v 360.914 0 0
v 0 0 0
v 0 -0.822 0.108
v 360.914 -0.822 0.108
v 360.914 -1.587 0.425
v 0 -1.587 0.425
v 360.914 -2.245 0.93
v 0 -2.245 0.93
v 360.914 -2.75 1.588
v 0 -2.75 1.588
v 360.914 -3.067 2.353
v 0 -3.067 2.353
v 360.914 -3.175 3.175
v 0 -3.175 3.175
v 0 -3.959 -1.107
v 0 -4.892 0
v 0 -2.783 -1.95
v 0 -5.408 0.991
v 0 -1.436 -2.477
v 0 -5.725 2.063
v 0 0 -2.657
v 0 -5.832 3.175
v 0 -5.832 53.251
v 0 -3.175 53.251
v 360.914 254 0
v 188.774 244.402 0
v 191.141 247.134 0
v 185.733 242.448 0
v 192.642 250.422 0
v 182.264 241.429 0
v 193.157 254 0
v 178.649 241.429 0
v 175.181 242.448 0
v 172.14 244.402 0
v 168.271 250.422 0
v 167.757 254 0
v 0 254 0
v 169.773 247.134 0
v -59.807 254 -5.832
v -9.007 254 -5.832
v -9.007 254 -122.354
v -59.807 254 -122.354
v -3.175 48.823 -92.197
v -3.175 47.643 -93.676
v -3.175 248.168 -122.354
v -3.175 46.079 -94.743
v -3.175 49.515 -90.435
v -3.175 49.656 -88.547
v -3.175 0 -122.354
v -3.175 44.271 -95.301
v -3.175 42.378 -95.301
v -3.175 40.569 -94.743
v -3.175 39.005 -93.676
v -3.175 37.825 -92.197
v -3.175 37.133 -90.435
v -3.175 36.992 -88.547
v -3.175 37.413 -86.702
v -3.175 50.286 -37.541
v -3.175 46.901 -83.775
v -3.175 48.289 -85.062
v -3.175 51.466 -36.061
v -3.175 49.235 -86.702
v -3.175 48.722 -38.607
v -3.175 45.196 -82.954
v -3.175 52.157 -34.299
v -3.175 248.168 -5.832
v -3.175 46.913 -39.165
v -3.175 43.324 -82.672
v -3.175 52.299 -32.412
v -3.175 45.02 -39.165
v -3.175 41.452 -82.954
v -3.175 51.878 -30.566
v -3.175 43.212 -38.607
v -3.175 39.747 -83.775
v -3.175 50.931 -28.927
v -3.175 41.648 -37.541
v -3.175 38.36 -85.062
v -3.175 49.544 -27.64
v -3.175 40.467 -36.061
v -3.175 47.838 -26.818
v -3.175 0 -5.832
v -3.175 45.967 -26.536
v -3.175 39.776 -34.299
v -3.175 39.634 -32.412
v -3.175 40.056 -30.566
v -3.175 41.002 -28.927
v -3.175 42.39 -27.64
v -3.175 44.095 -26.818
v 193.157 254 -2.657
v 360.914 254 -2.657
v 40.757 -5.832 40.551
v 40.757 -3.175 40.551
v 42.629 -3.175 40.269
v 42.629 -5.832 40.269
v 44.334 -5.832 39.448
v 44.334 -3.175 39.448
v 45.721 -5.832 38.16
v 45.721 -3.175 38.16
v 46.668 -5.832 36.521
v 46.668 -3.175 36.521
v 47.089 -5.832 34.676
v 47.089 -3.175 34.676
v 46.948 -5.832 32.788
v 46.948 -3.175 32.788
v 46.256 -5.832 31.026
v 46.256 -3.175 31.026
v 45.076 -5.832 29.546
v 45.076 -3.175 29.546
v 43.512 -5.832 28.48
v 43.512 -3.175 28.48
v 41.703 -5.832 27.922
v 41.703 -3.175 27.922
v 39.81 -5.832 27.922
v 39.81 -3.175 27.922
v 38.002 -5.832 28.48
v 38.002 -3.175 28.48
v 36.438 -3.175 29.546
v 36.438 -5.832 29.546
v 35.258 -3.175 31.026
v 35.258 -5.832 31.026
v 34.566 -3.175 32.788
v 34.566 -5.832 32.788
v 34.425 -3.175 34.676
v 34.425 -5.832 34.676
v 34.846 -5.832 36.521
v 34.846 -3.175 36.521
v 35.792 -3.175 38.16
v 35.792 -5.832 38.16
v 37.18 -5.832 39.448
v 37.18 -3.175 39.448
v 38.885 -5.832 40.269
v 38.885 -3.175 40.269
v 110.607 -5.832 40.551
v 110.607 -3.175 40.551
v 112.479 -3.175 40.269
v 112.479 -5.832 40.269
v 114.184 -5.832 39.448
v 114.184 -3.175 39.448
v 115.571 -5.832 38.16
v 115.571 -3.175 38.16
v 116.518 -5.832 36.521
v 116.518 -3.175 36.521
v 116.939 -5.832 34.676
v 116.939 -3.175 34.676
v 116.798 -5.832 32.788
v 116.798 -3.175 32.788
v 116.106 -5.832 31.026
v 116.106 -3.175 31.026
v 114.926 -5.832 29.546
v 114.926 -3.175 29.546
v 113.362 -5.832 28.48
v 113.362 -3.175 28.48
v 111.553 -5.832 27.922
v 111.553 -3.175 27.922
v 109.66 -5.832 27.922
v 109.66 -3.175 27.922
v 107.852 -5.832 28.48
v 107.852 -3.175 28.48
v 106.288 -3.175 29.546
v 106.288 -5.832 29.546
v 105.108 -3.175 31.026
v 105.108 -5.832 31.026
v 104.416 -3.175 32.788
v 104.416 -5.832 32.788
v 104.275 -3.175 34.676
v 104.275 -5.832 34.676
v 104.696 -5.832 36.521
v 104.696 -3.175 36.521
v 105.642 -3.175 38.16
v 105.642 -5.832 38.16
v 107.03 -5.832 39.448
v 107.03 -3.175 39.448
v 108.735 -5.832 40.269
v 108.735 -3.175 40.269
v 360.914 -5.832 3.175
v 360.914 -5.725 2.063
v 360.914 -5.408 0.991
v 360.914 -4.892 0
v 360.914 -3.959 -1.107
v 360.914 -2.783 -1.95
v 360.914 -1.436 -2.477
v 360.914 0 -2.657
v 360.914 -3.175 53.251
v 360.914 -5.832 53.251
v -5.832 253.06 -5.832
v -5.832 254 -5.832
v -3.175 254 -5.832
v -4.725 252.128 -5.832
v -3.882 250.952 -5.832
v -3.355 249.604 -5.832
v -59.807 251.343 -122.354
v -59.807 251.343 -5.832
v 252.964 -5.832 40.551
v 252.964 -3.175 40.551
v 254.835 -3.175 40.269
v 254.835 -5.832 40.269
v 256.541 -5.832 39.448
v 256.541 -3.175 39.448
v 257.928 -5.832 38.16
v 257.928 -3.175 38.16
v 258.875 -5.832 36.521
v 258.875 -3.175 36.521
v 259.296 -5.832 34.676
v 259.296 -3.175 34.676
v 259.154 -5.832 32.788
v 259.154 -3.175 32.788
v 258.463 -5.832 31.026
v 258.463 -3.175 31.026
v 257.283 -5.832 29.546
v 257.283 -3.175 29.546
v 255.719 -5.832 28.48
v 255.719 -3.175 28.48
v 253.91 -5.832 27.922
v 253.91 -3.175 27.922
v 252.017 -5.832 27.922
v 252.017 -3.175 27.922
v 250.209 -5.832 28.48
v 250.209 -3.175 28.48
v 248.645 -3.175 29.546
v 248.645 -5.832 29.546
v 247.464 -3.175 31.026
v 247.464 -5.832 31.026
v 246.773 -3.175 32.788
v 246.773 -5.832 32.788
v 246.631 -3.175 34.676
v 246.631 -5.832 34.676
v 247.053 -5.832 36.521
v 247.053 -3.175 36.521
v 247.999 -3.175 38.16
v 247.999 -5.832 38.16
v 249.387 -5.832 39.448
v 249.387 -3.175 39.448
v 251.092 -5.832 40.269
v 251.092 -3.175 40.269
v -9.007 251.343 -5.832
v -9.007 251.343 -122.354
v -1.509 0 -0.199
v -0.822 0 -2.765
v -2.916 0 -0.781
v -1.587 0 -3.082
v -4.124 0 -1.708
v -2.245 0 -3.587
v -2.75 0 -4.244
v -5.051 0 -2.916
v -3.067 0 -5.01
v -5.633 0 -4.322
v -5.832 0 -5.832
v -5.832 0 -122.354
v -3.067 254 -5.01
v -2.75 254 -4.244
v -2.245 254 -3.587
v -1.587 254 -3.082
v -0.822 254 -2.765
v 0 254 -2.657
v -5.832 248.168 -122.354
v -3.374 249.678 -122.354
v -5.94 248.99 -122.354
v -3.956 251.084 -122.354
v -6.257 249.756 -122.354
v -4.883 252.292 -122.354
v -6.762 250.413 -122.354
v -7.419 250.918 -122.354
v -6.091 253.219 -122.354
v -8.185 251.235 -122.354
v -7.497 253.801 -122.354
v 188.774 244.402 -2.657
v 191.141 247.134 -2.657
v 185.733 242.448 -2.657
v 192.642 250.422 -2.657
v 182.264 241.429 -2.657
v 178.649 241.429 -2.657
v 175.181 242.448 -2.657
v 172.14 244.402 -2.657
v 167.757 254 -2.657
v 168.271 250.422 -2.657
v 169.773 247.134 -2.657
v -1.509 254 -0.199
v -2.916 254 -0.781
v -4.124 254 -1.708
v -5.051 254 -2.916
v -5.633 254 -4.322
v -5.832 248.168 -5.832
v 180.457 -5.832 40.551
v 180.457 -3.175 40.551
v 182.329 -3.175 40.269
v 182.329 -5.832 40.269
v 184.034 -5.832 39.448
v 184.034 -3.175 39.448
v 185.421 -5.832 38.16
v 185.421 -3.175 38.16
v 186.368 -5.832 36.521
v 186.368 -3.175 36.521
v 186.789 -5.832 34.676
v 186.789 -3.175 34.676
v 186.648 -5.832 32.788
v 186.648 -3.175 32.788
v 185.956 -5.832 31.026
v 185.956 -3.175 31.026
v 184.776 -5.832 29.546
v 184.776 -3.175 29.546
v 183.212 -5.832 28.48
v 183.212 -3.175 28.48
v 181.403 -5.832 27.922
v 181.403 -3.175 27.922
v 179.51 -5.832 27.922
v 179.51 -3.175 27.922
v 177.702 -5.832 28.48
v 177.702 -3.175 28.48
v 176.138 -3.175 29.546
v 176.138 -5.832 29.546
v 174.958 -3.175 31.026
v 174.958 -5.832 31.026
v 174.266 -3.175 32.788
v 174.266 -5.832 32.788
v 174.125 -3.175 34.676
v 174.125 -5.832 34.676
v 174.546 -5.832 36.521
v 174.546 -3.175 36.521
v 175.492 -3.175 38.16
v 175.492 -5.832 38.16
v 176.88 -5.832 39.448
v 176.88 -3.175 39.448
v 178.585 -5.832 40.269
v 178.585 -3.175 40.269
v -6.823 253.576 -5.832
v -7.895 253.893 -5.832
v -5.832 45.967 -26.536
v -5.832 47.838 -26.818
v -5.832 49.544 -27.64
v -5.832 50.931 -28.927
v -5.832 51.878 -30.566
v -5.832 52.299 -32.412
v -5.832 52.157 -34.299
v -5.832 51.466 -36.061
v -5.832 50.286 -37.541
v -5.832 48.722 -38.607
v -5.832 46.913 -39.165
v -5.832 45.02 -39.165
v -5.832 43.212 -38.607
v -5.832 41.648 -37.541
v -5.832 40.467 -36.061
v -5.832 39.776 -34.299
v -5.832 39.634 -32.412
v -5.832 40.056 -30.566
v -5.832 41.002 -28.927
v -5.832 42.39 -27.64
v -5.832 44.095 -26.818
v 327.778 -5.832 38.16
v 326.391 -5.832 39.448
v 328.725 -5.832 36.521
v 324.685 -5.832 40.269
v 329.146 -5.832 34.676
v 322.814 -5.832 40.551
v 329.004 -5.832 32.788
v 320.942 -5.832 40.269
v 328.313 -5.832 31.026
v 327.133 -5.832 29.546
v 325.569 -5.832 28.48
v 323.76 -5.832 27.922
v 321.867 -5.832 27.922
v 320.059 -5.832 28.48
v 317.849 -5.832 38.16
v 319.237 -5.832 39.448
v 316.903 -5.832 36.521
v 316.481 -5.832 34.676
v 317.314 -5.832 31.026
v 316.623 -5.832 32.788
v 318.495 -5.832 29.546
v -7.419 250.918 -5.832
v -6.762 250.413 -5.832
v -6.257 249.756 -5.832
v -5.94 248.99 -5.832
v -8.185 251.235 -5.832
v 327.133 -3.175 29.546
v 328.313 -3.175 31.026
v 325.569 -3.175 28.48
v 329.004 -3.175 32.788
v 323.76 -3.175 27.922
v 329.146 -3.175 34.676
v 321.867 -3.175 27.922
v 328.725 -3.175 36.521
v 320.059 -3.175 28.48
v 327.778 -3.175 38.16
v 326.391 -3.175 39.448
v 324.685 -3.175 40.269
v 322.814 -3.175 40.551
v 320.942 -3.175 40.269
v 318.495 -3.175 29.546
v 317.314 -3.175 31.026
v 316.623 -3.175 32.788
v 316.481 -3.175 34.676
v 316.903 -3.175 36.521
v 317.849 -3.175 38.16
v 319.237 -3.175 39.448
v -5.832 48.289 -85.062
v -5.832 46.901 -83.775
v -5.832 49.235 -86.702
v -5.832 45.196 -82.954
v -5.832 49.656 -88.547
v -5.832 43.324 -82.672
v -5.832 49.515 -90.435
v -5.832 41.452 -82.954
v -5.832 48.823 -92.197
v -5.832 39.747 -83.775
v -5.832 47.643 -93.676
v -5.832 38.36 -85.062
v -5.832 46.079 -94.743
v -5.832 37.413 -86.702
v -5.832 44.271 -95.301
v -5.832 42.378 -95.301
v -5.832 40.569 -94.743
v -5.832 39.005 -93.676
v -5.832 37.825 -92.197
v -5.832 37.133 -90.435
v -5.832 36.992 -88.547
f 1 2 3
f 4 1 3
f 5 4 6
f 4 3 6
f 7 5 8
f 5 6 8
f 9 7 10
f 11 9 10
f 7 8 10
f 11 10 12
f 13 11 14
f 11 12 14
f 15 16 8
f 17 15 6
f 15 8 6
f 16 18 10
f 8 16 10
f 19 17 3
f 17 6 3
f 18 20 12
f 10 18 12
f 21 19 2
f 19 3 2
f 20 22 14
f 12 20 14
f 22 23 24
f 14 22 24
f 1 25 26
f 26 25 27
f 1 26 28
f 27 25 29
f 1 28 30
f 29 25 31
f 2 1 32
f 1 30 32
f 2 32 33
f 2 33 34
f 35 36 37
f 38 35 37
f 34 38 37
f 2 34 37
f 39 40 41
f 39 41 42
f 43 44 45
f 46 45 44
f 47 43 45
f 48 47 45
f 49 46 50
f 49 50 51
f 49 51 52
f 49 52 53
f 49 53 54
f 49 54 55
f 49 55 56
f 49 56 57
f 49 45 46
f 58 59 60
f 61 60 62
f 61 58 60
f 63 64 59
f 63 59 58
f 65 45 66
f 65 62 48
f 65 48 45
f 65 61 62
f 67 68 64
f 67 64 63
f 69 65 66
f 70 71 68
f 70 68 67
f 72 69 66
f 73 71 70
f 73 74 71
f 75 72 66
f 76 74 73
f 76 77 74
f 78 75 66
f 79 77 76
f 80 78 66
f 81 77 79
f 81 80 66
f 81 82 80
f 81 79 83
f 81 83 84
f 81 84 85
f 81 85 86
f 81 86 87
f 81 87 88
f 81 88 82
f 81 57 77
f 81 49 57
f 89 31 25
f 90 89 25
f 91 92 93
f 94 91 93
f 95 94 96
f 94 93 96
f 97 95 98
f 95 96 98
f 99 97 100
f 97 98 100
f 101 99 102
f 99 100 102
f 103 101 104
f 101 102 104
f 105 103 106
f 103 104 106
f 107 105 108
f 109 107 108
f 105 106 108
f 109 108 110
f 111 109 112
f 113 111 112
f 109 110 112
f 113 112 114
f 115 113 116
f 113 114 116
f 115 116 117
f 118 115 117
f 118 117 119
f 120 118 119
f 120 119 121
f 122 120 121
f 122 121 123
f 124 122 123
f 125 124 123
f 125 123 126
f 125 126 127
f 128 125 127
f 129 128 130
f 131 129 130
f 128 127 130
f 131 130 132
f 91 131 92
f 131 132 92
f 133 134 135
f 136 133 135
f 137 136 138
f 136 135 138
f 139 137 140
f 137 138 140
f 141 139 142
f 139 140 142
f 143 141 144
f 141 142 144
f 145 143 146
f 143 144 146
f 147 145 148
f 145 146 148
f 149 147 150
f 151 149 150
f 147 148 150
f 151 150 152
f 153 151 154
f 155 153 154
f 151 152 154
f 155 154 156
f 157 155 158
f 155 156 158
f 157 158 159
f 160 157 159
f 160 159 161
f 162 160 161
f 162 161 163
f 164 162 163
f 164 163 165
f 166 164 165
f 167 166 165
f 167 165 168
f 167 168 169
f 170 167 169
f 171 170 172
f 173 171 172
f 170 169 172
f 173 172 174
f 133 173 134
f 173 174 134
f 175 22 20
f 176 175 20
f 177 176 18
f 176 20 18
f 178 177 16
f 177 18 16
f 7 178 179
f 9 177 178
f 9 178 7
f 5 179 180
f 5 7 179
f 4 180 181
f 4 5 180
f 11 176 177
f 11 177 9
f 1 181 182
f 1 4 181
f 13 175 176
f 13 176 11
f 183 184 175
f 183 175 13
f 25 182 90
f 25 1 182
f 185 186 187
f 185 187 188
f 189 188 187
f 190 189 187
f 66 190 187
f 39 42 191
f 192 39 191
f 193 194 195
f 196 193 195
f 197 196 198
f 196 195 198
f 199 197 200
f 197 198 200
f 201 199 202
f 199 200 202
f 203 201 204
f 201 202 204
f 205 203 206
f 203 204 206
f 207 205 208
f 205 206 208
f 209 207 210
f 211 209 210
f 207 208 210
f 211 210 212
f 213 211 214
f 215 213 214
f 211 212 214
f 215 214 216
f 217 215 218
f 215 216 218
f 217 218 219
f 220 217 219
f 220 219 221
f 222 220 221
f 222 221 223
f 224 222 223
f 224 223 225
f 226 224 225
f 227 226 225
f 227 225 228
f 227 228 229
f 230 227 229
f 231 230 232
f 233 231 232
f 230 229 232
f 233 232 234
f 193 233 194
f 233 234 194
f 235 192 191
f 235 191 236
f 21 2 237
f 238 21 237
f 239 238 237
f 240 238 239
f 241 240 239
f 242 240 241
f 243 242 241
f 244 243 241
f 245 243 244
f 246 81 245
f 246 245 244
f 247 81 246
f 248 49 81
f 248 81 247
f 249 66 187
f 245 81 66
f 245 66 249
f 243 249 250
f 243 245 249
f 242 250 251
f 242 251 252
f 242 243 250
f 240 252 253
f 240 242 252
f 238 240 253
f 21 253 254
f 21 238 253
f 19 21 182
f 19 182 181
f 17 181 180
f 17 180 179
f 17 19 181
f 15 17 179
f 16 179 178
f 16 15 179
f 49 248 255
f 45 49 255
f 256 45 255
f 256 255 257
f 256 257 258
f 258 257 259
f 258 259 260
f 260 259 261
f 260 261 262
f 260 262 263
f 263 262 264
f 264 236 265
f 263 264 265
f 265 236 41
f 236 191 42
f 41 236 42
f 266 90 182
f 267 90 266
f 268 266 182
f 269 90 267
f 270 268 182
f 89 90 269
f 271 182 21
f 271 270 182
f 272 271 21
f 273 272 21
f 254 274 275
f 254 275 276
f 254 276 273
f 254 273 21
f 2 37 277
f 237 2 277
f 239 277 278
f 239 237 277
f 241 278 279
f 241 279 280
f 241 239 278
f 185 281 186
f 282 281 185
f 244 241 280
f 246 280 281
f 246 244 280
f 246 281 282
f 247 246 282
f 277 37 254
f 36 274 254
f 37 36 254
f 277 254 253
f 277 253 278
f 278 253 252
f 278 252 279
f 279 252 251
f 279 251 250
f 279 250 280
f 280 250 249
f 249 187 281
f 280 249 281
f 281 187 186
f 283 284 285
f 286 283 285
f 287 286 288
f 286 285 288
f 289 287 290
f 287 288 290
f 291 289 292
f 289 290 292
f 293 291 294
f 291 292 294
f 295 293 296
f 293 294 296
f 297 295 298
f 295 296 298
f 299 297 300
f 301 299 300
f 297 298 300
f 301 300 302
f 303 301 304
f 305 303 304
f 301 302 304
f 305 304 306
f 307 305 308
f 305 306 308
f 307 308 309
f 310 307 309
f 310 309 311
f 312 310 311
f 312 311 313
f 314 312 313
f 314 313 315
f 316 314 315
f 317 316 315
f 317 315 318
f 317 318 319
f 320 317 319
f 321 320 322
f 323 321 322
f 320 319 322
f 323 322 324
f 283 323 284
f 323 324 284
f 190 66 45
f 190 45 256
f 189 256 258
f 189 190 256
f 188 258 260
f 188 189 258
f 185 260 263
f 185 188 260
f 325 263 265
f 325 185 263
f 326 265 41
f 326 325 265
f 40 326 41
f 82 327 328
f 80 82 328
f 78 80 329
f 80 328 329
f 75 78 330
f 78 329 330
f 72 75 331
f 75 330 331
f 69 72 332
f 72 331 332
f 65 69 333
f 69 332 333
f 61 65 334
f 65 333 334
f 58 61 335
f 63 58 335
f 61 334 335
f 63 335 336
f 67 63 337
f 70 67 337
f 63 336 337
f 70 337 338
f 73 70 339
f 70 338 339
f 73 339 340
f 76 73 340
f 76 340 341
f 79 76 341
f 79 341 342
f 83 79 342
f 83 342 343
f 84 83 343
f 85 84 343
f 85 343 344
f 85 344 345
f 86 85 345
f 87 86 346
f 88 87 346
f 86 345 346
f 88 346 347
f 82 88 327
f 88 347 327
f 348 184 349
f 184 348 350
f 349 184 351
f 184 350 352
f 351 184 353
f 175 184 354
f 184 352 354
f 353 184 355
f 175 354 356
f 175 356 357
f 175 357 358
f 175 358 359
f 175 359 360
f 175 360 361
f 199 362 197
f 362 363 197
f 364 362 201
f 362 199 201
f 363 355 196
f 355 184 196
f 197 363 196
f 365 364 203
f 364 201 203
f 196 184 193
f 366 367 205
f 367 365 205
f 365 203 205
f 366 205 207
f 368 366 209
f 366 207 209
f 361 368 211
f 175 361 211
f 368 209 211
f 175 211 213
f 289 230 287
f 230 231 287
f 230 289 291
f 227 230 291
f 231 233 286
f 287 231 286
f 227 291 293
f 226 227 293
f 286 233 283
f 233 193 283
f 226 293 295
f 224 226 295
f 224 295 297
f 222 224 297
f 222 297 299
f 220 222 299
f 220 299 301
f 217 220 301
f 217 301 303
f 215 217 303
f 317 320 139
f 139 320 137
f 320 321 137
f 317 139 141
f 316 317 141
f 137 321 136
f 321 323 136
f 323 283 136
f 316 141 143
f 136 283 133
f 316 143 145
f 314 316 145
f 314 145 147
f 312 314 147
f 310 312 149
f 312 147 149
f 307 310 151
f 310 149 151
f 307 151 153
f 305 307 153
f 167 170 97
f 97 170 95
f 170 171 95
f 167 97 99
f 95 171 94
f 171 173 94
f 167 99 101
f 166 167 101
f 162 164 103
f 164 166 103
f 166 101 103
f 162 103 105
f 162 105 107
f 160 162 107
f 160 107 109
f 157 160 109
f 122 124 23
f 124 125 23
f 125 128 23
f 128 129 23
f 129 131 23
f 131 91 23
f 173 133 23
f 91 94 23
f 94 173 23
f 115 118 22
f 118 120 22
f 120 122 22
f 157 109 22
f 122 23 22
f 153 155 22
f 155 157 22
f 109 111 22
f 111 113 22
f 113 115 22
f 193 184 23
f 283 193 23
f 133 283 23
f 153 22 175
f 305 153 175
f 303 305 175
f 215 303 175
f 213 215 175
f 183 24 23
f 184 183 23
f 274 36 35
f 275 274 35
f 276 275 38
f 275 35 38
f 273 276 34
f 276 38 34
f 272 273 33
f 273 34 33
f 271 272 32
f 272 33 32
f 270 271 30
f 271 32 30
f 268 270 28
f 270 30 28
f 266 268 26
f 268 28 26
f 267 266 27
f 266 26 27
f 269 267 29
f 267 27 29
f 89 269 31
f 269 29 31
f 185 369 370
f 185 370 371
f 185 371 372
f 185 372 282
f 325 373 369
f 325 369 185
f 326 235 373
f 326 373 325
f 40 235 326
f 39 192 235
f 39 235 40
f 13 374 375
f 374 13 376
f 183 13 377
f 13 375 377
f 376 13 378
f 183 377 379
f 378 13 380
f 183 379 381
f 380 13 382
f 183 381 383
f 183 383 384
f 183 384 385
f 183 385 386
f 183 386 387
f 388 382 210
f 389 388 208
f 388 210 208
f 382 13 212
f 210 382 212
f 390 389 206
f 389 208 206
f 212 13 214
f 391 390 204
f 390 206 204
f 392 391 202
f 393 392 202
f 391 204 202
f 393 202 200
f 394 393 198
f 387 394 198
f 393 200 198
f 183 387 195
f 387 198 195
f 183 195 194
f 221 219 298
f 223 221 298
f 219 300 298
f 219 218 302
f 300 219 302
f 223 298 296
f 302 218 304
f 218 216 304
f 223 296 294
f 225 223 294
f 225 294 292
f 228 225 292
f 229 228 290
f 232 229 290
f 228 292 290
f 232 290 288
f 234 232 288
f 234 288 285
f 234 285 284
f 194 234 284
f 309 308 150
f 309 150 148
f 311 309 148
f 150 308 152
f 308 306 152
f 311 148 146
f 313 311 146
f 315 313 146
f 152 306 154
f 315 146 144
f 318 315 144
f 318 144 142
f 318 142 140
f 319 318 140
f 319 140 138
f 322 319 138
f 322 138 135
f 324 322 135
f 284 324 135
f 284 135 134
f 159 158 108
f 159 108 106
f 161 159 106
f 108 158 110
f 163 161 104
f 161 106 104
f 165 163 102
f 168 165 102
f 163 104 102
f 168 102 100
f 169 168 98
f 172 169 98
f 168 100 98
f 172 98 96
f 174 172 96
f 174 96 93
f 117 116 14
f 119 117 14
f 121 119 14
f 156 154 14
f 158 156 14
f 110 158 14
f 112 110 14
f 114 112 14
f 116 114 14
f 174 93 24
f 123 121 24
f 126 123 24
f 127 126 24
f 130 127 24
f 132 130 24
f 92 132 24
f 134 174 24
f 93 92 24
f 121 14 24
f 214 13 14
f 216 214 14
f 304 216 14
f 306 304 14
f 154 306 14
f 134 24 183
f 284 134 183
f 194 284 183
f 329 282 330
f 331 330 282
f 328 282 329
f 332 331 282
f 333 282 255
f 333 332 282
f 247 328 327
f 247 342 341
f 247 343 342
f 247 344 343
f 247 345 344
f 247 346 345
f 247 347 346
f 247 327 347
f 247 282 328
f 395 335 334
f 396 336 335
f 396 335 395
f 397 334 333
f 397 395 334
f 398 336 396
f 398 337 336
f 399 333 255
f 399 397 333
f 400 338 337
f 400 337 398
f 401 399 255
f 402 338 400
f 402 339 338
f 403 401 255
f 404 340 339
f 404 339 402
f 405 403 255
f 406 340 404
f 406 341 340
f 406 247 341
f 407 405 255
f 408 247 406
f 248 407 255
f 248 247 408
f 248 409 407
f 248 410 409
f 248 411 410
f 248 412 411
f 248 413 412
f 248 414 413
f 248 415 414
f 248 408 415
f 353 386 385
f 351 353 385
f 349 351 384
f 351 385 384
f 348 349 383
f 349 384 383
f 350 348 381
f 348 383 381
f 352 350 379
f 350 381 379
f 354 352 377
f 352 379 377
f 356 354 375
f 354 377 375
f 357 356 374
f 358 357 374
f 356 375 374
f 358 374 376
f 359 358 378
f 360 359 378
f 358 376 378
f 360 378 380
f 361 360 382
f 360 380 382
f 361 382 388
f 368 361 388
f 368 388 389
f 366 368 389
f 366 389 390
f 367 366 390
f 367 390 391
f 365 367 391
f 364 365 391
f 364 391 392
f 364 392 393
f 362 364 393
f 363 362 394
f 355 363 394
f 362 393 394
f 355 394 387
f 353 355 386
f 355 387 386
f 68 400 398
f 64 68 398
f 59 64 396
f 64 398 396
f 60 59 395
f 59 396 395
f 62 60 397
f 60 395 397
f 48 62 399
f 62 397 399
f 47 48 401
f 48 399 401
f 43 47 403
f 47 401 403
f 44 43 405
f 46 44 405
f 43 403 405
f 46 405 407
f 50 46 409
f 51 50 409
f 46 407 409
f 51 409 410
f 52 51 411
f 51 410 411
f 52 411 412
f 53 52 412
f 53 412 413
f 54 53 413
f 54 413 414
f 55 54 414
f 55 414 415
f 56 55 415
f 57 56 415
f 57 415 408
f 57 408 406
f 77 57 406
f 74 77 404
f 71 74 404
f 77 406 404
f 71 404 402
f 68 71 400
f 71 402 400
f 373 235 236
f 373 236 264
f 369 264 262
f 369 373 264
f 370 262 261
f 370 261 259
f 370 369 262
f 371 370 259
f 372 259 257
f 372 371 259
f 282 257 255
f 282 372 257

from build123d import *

# Parameters (mm, degrees)
BASE_FLANGE1_DEPTH           = 2.65684
SKETCHED_BEND3_DEPTH         = 360.91368
SKETCHED_BEND3_2_DEPTH       = 360.91368
SKETCH10_R                   = 6.35
CUT_EXTRUDE2_DEPTH           = 2.65684
EDGE_FLANGE5_DEPTH           = 254
EDGE_FLANGE6_STRIP_W         = 16.97736
EDGE_FLANGE6_STRIP_H         = 2.65684
EDGE_FLANGE6_STRIP_CUT_DEPTH = 116.5225
EDGE_FLANGE6_DEPTH           = 116.5225
SKETCH36_R                   = 6.35
CUT_EXTRUDE3_DEPTH           = 2.65684


# Read off the part's stored shape, not the designer's step: Sketched Bend3
# Sheet-metal steps are written as plain solids
with BuildPart() as part:
    # Sketch1 → Base-Flange1 (new body)
    with BuildSketch(Plane.XY):
        with BuildLine():
            Line((0, 0), (0, 254))
            Line((0, 254), (167.75684, 254))
            ThreePointArc((167.75684, 254), (180.45684, 241.3), (193.15684, 254))
            Line((193.15684, 254), (360.91368, 254))
            Line((360.91368, 254), (360.91368, 0))
            Line((360.91368, 0), (360.91368, -57.15))
            Line((360.91368, -57.15), (0, -57.15))
            Line((0, -57.15), (0, 0))
        make_face()
    extrude(amount=-BASE_FLANGE1_DEPTH)

    # Sketched Bend3 outline → Sketched Bend3 (cut)
    with BuildSketch(Plane.YZ):
        with BuildLine():
            ThreePointArc((0, -2.65684), (-2.783367186, -1.949765838), (-4.891802611, 0))
            Line((-4.891802611, 0), (-57.15, 0))
            Line((-57.15, 0), (-57.15, -2.65684))
            Line((-57.15, -2.65684), (0, -2.65684))
        make_face()
    extrude(amount=SKETCHED_BEND3_DEPTH, mode=Mode.SUBTRACT)

    # Sketched Bend3 2 outline → Sketched Bend3 2 (add)
    with BuildSketch(Plane.YZ):
        with BuildLine():
            ThreePointArc((0, 0), (-2.24506403, 0.92993597), (-3.175, 3.175))
            Line((-3.175, 3.175), (-3.175, 53.251044406))
            Line((-3.175, 53.251044406), (-5.83184, 53.251044406))
            Line((-5.83184, 53.251044406), (-5.83184, 3.175))
            ThreePointArc((-5.83184, 3.175), (-5.591894488, 1.519381136), (-4.891802611, 0))
            Line((-4.891802611, 0), (0, 0))
        make_face()
    extrude(amount=SKETCHED_BEND3_2_DEPTH)

    # Sketch10 → Cut-Extrude2 (cut)
    with BuildSketch(Plane(origin=(0, -3.175, 0), x_dir=(1, 0, 0), z_dir=(0, 1, 0))):
        with Locations(Location((322.81368, -34.201044406, 0), (0, 0, 270))):
            Circle(SKETCH10_R)
        with Locations(Location((252.96368, -34.201044406, 0), (0, 0, 270))):
            Circle(SKETCH10_R)
        with Locations(Location((40.75684, -34.201044406, 0), (0, 0, 270))):
            Circle(SKETCH10_R)
        with Locations(Location((110.60684, -34.201044406, 0), (0, 0, 270))):
            Circle(SKETCH10_R)
        with Locations(Location((180.45684, -34.201044406, 0), (0, 0, 270))):
            Circle(SKETCH10_R)
    extrude(amount=-CUT_EXTRUDE2_DEPTH, mode=Mode.SUBTRACT)

    # Edge-Flange5 section (across the edge) → Edge-Flange5 (add)
    with BuildSketch(Plane(origin=(-3.175, 0, -2.65684), x_dir=(1, 0, 0), z_dir=(0, 1, 0))):
        with BuildLine():
            Line((-2.65684, 3.175), (-2.65684, 119.6975))
            Line((-2.65684, 119.6975), (0, 119.6975))
            Line((0, 119.6975), (0, 3.175))
            ThreePointArc((0, 3.175), (0.92993597, 0.92993597), (3.175, 0))
            Line((3.175, 0), (3.175, -2.65684))
            ThreePointArc((3.175, -2.65684), (-0.948733611, -0.948733611), (-2.65684, 3.175))
        make_face()
    extrude(amount=EDGE_FLANGE5_DEPTH)

    # Edge-Flange6 strip (across the edge) → Edge-Flange6 strip cut (cut)
    with BuildSketch(Plane(origin=(-5.83184, 254, -5.83184), x_dir=(0, -1, 0), z_dir=(0, 0, -1))):
        with Locations((-2.65684, -1.32842)):
            Rectangle(EDGE_FLANGE6_STRIP_W, EDGE_FLANGE6_STRIP_H)
    extrude(amount=EDGE_FLANGE6_STRIP_CUT_DEPTH, mode=Mode.SUBTRACT)

    # Edge-Flange6 section (across the edge) → Edge-Flange6 (add)
    with BuildSketch(Plane(origin=(-5.83184, 254, -5.83184), x_dir=(0, -1, 0), z_dir=(0, 0, -1))):
        with BuildLine():
            Line((0, 3.175), (0, 53.975))
            Line((0, 53.975), (2.65684, 53.975))
            Line((2.65684, 53.975), (2.65684, 3.175))
            ThreePointArc((2.65684, 3.175), (3.58677597, 0.92993597), (5.83184, 0))
            Line((5.83184, 0), (5.83184, -2.65684))
            ThreePointArc((5.83184, -2.65684), (1.708106389, -0.948733611), (0, 3.175))
        make_face()
    extrude(amount=EDGE_FLANGE6_DEPTH)

    # Sketch36 → Cut-Extrude3 (cut)
    with BuildSketch(Plane.ZY.offset(5.83184)):
        with Locations((-32.886251514, 45.966665125)):
            Circle(SKETCH36_R)
        with Locations((-89.021589499, 43.324159587)):
            Circle(SKETCH36_R)
    extrude(amount=-CUT_EXTRUDE3_DEPTH, mode=Mode.SUBTRACT)


solid = part.part
